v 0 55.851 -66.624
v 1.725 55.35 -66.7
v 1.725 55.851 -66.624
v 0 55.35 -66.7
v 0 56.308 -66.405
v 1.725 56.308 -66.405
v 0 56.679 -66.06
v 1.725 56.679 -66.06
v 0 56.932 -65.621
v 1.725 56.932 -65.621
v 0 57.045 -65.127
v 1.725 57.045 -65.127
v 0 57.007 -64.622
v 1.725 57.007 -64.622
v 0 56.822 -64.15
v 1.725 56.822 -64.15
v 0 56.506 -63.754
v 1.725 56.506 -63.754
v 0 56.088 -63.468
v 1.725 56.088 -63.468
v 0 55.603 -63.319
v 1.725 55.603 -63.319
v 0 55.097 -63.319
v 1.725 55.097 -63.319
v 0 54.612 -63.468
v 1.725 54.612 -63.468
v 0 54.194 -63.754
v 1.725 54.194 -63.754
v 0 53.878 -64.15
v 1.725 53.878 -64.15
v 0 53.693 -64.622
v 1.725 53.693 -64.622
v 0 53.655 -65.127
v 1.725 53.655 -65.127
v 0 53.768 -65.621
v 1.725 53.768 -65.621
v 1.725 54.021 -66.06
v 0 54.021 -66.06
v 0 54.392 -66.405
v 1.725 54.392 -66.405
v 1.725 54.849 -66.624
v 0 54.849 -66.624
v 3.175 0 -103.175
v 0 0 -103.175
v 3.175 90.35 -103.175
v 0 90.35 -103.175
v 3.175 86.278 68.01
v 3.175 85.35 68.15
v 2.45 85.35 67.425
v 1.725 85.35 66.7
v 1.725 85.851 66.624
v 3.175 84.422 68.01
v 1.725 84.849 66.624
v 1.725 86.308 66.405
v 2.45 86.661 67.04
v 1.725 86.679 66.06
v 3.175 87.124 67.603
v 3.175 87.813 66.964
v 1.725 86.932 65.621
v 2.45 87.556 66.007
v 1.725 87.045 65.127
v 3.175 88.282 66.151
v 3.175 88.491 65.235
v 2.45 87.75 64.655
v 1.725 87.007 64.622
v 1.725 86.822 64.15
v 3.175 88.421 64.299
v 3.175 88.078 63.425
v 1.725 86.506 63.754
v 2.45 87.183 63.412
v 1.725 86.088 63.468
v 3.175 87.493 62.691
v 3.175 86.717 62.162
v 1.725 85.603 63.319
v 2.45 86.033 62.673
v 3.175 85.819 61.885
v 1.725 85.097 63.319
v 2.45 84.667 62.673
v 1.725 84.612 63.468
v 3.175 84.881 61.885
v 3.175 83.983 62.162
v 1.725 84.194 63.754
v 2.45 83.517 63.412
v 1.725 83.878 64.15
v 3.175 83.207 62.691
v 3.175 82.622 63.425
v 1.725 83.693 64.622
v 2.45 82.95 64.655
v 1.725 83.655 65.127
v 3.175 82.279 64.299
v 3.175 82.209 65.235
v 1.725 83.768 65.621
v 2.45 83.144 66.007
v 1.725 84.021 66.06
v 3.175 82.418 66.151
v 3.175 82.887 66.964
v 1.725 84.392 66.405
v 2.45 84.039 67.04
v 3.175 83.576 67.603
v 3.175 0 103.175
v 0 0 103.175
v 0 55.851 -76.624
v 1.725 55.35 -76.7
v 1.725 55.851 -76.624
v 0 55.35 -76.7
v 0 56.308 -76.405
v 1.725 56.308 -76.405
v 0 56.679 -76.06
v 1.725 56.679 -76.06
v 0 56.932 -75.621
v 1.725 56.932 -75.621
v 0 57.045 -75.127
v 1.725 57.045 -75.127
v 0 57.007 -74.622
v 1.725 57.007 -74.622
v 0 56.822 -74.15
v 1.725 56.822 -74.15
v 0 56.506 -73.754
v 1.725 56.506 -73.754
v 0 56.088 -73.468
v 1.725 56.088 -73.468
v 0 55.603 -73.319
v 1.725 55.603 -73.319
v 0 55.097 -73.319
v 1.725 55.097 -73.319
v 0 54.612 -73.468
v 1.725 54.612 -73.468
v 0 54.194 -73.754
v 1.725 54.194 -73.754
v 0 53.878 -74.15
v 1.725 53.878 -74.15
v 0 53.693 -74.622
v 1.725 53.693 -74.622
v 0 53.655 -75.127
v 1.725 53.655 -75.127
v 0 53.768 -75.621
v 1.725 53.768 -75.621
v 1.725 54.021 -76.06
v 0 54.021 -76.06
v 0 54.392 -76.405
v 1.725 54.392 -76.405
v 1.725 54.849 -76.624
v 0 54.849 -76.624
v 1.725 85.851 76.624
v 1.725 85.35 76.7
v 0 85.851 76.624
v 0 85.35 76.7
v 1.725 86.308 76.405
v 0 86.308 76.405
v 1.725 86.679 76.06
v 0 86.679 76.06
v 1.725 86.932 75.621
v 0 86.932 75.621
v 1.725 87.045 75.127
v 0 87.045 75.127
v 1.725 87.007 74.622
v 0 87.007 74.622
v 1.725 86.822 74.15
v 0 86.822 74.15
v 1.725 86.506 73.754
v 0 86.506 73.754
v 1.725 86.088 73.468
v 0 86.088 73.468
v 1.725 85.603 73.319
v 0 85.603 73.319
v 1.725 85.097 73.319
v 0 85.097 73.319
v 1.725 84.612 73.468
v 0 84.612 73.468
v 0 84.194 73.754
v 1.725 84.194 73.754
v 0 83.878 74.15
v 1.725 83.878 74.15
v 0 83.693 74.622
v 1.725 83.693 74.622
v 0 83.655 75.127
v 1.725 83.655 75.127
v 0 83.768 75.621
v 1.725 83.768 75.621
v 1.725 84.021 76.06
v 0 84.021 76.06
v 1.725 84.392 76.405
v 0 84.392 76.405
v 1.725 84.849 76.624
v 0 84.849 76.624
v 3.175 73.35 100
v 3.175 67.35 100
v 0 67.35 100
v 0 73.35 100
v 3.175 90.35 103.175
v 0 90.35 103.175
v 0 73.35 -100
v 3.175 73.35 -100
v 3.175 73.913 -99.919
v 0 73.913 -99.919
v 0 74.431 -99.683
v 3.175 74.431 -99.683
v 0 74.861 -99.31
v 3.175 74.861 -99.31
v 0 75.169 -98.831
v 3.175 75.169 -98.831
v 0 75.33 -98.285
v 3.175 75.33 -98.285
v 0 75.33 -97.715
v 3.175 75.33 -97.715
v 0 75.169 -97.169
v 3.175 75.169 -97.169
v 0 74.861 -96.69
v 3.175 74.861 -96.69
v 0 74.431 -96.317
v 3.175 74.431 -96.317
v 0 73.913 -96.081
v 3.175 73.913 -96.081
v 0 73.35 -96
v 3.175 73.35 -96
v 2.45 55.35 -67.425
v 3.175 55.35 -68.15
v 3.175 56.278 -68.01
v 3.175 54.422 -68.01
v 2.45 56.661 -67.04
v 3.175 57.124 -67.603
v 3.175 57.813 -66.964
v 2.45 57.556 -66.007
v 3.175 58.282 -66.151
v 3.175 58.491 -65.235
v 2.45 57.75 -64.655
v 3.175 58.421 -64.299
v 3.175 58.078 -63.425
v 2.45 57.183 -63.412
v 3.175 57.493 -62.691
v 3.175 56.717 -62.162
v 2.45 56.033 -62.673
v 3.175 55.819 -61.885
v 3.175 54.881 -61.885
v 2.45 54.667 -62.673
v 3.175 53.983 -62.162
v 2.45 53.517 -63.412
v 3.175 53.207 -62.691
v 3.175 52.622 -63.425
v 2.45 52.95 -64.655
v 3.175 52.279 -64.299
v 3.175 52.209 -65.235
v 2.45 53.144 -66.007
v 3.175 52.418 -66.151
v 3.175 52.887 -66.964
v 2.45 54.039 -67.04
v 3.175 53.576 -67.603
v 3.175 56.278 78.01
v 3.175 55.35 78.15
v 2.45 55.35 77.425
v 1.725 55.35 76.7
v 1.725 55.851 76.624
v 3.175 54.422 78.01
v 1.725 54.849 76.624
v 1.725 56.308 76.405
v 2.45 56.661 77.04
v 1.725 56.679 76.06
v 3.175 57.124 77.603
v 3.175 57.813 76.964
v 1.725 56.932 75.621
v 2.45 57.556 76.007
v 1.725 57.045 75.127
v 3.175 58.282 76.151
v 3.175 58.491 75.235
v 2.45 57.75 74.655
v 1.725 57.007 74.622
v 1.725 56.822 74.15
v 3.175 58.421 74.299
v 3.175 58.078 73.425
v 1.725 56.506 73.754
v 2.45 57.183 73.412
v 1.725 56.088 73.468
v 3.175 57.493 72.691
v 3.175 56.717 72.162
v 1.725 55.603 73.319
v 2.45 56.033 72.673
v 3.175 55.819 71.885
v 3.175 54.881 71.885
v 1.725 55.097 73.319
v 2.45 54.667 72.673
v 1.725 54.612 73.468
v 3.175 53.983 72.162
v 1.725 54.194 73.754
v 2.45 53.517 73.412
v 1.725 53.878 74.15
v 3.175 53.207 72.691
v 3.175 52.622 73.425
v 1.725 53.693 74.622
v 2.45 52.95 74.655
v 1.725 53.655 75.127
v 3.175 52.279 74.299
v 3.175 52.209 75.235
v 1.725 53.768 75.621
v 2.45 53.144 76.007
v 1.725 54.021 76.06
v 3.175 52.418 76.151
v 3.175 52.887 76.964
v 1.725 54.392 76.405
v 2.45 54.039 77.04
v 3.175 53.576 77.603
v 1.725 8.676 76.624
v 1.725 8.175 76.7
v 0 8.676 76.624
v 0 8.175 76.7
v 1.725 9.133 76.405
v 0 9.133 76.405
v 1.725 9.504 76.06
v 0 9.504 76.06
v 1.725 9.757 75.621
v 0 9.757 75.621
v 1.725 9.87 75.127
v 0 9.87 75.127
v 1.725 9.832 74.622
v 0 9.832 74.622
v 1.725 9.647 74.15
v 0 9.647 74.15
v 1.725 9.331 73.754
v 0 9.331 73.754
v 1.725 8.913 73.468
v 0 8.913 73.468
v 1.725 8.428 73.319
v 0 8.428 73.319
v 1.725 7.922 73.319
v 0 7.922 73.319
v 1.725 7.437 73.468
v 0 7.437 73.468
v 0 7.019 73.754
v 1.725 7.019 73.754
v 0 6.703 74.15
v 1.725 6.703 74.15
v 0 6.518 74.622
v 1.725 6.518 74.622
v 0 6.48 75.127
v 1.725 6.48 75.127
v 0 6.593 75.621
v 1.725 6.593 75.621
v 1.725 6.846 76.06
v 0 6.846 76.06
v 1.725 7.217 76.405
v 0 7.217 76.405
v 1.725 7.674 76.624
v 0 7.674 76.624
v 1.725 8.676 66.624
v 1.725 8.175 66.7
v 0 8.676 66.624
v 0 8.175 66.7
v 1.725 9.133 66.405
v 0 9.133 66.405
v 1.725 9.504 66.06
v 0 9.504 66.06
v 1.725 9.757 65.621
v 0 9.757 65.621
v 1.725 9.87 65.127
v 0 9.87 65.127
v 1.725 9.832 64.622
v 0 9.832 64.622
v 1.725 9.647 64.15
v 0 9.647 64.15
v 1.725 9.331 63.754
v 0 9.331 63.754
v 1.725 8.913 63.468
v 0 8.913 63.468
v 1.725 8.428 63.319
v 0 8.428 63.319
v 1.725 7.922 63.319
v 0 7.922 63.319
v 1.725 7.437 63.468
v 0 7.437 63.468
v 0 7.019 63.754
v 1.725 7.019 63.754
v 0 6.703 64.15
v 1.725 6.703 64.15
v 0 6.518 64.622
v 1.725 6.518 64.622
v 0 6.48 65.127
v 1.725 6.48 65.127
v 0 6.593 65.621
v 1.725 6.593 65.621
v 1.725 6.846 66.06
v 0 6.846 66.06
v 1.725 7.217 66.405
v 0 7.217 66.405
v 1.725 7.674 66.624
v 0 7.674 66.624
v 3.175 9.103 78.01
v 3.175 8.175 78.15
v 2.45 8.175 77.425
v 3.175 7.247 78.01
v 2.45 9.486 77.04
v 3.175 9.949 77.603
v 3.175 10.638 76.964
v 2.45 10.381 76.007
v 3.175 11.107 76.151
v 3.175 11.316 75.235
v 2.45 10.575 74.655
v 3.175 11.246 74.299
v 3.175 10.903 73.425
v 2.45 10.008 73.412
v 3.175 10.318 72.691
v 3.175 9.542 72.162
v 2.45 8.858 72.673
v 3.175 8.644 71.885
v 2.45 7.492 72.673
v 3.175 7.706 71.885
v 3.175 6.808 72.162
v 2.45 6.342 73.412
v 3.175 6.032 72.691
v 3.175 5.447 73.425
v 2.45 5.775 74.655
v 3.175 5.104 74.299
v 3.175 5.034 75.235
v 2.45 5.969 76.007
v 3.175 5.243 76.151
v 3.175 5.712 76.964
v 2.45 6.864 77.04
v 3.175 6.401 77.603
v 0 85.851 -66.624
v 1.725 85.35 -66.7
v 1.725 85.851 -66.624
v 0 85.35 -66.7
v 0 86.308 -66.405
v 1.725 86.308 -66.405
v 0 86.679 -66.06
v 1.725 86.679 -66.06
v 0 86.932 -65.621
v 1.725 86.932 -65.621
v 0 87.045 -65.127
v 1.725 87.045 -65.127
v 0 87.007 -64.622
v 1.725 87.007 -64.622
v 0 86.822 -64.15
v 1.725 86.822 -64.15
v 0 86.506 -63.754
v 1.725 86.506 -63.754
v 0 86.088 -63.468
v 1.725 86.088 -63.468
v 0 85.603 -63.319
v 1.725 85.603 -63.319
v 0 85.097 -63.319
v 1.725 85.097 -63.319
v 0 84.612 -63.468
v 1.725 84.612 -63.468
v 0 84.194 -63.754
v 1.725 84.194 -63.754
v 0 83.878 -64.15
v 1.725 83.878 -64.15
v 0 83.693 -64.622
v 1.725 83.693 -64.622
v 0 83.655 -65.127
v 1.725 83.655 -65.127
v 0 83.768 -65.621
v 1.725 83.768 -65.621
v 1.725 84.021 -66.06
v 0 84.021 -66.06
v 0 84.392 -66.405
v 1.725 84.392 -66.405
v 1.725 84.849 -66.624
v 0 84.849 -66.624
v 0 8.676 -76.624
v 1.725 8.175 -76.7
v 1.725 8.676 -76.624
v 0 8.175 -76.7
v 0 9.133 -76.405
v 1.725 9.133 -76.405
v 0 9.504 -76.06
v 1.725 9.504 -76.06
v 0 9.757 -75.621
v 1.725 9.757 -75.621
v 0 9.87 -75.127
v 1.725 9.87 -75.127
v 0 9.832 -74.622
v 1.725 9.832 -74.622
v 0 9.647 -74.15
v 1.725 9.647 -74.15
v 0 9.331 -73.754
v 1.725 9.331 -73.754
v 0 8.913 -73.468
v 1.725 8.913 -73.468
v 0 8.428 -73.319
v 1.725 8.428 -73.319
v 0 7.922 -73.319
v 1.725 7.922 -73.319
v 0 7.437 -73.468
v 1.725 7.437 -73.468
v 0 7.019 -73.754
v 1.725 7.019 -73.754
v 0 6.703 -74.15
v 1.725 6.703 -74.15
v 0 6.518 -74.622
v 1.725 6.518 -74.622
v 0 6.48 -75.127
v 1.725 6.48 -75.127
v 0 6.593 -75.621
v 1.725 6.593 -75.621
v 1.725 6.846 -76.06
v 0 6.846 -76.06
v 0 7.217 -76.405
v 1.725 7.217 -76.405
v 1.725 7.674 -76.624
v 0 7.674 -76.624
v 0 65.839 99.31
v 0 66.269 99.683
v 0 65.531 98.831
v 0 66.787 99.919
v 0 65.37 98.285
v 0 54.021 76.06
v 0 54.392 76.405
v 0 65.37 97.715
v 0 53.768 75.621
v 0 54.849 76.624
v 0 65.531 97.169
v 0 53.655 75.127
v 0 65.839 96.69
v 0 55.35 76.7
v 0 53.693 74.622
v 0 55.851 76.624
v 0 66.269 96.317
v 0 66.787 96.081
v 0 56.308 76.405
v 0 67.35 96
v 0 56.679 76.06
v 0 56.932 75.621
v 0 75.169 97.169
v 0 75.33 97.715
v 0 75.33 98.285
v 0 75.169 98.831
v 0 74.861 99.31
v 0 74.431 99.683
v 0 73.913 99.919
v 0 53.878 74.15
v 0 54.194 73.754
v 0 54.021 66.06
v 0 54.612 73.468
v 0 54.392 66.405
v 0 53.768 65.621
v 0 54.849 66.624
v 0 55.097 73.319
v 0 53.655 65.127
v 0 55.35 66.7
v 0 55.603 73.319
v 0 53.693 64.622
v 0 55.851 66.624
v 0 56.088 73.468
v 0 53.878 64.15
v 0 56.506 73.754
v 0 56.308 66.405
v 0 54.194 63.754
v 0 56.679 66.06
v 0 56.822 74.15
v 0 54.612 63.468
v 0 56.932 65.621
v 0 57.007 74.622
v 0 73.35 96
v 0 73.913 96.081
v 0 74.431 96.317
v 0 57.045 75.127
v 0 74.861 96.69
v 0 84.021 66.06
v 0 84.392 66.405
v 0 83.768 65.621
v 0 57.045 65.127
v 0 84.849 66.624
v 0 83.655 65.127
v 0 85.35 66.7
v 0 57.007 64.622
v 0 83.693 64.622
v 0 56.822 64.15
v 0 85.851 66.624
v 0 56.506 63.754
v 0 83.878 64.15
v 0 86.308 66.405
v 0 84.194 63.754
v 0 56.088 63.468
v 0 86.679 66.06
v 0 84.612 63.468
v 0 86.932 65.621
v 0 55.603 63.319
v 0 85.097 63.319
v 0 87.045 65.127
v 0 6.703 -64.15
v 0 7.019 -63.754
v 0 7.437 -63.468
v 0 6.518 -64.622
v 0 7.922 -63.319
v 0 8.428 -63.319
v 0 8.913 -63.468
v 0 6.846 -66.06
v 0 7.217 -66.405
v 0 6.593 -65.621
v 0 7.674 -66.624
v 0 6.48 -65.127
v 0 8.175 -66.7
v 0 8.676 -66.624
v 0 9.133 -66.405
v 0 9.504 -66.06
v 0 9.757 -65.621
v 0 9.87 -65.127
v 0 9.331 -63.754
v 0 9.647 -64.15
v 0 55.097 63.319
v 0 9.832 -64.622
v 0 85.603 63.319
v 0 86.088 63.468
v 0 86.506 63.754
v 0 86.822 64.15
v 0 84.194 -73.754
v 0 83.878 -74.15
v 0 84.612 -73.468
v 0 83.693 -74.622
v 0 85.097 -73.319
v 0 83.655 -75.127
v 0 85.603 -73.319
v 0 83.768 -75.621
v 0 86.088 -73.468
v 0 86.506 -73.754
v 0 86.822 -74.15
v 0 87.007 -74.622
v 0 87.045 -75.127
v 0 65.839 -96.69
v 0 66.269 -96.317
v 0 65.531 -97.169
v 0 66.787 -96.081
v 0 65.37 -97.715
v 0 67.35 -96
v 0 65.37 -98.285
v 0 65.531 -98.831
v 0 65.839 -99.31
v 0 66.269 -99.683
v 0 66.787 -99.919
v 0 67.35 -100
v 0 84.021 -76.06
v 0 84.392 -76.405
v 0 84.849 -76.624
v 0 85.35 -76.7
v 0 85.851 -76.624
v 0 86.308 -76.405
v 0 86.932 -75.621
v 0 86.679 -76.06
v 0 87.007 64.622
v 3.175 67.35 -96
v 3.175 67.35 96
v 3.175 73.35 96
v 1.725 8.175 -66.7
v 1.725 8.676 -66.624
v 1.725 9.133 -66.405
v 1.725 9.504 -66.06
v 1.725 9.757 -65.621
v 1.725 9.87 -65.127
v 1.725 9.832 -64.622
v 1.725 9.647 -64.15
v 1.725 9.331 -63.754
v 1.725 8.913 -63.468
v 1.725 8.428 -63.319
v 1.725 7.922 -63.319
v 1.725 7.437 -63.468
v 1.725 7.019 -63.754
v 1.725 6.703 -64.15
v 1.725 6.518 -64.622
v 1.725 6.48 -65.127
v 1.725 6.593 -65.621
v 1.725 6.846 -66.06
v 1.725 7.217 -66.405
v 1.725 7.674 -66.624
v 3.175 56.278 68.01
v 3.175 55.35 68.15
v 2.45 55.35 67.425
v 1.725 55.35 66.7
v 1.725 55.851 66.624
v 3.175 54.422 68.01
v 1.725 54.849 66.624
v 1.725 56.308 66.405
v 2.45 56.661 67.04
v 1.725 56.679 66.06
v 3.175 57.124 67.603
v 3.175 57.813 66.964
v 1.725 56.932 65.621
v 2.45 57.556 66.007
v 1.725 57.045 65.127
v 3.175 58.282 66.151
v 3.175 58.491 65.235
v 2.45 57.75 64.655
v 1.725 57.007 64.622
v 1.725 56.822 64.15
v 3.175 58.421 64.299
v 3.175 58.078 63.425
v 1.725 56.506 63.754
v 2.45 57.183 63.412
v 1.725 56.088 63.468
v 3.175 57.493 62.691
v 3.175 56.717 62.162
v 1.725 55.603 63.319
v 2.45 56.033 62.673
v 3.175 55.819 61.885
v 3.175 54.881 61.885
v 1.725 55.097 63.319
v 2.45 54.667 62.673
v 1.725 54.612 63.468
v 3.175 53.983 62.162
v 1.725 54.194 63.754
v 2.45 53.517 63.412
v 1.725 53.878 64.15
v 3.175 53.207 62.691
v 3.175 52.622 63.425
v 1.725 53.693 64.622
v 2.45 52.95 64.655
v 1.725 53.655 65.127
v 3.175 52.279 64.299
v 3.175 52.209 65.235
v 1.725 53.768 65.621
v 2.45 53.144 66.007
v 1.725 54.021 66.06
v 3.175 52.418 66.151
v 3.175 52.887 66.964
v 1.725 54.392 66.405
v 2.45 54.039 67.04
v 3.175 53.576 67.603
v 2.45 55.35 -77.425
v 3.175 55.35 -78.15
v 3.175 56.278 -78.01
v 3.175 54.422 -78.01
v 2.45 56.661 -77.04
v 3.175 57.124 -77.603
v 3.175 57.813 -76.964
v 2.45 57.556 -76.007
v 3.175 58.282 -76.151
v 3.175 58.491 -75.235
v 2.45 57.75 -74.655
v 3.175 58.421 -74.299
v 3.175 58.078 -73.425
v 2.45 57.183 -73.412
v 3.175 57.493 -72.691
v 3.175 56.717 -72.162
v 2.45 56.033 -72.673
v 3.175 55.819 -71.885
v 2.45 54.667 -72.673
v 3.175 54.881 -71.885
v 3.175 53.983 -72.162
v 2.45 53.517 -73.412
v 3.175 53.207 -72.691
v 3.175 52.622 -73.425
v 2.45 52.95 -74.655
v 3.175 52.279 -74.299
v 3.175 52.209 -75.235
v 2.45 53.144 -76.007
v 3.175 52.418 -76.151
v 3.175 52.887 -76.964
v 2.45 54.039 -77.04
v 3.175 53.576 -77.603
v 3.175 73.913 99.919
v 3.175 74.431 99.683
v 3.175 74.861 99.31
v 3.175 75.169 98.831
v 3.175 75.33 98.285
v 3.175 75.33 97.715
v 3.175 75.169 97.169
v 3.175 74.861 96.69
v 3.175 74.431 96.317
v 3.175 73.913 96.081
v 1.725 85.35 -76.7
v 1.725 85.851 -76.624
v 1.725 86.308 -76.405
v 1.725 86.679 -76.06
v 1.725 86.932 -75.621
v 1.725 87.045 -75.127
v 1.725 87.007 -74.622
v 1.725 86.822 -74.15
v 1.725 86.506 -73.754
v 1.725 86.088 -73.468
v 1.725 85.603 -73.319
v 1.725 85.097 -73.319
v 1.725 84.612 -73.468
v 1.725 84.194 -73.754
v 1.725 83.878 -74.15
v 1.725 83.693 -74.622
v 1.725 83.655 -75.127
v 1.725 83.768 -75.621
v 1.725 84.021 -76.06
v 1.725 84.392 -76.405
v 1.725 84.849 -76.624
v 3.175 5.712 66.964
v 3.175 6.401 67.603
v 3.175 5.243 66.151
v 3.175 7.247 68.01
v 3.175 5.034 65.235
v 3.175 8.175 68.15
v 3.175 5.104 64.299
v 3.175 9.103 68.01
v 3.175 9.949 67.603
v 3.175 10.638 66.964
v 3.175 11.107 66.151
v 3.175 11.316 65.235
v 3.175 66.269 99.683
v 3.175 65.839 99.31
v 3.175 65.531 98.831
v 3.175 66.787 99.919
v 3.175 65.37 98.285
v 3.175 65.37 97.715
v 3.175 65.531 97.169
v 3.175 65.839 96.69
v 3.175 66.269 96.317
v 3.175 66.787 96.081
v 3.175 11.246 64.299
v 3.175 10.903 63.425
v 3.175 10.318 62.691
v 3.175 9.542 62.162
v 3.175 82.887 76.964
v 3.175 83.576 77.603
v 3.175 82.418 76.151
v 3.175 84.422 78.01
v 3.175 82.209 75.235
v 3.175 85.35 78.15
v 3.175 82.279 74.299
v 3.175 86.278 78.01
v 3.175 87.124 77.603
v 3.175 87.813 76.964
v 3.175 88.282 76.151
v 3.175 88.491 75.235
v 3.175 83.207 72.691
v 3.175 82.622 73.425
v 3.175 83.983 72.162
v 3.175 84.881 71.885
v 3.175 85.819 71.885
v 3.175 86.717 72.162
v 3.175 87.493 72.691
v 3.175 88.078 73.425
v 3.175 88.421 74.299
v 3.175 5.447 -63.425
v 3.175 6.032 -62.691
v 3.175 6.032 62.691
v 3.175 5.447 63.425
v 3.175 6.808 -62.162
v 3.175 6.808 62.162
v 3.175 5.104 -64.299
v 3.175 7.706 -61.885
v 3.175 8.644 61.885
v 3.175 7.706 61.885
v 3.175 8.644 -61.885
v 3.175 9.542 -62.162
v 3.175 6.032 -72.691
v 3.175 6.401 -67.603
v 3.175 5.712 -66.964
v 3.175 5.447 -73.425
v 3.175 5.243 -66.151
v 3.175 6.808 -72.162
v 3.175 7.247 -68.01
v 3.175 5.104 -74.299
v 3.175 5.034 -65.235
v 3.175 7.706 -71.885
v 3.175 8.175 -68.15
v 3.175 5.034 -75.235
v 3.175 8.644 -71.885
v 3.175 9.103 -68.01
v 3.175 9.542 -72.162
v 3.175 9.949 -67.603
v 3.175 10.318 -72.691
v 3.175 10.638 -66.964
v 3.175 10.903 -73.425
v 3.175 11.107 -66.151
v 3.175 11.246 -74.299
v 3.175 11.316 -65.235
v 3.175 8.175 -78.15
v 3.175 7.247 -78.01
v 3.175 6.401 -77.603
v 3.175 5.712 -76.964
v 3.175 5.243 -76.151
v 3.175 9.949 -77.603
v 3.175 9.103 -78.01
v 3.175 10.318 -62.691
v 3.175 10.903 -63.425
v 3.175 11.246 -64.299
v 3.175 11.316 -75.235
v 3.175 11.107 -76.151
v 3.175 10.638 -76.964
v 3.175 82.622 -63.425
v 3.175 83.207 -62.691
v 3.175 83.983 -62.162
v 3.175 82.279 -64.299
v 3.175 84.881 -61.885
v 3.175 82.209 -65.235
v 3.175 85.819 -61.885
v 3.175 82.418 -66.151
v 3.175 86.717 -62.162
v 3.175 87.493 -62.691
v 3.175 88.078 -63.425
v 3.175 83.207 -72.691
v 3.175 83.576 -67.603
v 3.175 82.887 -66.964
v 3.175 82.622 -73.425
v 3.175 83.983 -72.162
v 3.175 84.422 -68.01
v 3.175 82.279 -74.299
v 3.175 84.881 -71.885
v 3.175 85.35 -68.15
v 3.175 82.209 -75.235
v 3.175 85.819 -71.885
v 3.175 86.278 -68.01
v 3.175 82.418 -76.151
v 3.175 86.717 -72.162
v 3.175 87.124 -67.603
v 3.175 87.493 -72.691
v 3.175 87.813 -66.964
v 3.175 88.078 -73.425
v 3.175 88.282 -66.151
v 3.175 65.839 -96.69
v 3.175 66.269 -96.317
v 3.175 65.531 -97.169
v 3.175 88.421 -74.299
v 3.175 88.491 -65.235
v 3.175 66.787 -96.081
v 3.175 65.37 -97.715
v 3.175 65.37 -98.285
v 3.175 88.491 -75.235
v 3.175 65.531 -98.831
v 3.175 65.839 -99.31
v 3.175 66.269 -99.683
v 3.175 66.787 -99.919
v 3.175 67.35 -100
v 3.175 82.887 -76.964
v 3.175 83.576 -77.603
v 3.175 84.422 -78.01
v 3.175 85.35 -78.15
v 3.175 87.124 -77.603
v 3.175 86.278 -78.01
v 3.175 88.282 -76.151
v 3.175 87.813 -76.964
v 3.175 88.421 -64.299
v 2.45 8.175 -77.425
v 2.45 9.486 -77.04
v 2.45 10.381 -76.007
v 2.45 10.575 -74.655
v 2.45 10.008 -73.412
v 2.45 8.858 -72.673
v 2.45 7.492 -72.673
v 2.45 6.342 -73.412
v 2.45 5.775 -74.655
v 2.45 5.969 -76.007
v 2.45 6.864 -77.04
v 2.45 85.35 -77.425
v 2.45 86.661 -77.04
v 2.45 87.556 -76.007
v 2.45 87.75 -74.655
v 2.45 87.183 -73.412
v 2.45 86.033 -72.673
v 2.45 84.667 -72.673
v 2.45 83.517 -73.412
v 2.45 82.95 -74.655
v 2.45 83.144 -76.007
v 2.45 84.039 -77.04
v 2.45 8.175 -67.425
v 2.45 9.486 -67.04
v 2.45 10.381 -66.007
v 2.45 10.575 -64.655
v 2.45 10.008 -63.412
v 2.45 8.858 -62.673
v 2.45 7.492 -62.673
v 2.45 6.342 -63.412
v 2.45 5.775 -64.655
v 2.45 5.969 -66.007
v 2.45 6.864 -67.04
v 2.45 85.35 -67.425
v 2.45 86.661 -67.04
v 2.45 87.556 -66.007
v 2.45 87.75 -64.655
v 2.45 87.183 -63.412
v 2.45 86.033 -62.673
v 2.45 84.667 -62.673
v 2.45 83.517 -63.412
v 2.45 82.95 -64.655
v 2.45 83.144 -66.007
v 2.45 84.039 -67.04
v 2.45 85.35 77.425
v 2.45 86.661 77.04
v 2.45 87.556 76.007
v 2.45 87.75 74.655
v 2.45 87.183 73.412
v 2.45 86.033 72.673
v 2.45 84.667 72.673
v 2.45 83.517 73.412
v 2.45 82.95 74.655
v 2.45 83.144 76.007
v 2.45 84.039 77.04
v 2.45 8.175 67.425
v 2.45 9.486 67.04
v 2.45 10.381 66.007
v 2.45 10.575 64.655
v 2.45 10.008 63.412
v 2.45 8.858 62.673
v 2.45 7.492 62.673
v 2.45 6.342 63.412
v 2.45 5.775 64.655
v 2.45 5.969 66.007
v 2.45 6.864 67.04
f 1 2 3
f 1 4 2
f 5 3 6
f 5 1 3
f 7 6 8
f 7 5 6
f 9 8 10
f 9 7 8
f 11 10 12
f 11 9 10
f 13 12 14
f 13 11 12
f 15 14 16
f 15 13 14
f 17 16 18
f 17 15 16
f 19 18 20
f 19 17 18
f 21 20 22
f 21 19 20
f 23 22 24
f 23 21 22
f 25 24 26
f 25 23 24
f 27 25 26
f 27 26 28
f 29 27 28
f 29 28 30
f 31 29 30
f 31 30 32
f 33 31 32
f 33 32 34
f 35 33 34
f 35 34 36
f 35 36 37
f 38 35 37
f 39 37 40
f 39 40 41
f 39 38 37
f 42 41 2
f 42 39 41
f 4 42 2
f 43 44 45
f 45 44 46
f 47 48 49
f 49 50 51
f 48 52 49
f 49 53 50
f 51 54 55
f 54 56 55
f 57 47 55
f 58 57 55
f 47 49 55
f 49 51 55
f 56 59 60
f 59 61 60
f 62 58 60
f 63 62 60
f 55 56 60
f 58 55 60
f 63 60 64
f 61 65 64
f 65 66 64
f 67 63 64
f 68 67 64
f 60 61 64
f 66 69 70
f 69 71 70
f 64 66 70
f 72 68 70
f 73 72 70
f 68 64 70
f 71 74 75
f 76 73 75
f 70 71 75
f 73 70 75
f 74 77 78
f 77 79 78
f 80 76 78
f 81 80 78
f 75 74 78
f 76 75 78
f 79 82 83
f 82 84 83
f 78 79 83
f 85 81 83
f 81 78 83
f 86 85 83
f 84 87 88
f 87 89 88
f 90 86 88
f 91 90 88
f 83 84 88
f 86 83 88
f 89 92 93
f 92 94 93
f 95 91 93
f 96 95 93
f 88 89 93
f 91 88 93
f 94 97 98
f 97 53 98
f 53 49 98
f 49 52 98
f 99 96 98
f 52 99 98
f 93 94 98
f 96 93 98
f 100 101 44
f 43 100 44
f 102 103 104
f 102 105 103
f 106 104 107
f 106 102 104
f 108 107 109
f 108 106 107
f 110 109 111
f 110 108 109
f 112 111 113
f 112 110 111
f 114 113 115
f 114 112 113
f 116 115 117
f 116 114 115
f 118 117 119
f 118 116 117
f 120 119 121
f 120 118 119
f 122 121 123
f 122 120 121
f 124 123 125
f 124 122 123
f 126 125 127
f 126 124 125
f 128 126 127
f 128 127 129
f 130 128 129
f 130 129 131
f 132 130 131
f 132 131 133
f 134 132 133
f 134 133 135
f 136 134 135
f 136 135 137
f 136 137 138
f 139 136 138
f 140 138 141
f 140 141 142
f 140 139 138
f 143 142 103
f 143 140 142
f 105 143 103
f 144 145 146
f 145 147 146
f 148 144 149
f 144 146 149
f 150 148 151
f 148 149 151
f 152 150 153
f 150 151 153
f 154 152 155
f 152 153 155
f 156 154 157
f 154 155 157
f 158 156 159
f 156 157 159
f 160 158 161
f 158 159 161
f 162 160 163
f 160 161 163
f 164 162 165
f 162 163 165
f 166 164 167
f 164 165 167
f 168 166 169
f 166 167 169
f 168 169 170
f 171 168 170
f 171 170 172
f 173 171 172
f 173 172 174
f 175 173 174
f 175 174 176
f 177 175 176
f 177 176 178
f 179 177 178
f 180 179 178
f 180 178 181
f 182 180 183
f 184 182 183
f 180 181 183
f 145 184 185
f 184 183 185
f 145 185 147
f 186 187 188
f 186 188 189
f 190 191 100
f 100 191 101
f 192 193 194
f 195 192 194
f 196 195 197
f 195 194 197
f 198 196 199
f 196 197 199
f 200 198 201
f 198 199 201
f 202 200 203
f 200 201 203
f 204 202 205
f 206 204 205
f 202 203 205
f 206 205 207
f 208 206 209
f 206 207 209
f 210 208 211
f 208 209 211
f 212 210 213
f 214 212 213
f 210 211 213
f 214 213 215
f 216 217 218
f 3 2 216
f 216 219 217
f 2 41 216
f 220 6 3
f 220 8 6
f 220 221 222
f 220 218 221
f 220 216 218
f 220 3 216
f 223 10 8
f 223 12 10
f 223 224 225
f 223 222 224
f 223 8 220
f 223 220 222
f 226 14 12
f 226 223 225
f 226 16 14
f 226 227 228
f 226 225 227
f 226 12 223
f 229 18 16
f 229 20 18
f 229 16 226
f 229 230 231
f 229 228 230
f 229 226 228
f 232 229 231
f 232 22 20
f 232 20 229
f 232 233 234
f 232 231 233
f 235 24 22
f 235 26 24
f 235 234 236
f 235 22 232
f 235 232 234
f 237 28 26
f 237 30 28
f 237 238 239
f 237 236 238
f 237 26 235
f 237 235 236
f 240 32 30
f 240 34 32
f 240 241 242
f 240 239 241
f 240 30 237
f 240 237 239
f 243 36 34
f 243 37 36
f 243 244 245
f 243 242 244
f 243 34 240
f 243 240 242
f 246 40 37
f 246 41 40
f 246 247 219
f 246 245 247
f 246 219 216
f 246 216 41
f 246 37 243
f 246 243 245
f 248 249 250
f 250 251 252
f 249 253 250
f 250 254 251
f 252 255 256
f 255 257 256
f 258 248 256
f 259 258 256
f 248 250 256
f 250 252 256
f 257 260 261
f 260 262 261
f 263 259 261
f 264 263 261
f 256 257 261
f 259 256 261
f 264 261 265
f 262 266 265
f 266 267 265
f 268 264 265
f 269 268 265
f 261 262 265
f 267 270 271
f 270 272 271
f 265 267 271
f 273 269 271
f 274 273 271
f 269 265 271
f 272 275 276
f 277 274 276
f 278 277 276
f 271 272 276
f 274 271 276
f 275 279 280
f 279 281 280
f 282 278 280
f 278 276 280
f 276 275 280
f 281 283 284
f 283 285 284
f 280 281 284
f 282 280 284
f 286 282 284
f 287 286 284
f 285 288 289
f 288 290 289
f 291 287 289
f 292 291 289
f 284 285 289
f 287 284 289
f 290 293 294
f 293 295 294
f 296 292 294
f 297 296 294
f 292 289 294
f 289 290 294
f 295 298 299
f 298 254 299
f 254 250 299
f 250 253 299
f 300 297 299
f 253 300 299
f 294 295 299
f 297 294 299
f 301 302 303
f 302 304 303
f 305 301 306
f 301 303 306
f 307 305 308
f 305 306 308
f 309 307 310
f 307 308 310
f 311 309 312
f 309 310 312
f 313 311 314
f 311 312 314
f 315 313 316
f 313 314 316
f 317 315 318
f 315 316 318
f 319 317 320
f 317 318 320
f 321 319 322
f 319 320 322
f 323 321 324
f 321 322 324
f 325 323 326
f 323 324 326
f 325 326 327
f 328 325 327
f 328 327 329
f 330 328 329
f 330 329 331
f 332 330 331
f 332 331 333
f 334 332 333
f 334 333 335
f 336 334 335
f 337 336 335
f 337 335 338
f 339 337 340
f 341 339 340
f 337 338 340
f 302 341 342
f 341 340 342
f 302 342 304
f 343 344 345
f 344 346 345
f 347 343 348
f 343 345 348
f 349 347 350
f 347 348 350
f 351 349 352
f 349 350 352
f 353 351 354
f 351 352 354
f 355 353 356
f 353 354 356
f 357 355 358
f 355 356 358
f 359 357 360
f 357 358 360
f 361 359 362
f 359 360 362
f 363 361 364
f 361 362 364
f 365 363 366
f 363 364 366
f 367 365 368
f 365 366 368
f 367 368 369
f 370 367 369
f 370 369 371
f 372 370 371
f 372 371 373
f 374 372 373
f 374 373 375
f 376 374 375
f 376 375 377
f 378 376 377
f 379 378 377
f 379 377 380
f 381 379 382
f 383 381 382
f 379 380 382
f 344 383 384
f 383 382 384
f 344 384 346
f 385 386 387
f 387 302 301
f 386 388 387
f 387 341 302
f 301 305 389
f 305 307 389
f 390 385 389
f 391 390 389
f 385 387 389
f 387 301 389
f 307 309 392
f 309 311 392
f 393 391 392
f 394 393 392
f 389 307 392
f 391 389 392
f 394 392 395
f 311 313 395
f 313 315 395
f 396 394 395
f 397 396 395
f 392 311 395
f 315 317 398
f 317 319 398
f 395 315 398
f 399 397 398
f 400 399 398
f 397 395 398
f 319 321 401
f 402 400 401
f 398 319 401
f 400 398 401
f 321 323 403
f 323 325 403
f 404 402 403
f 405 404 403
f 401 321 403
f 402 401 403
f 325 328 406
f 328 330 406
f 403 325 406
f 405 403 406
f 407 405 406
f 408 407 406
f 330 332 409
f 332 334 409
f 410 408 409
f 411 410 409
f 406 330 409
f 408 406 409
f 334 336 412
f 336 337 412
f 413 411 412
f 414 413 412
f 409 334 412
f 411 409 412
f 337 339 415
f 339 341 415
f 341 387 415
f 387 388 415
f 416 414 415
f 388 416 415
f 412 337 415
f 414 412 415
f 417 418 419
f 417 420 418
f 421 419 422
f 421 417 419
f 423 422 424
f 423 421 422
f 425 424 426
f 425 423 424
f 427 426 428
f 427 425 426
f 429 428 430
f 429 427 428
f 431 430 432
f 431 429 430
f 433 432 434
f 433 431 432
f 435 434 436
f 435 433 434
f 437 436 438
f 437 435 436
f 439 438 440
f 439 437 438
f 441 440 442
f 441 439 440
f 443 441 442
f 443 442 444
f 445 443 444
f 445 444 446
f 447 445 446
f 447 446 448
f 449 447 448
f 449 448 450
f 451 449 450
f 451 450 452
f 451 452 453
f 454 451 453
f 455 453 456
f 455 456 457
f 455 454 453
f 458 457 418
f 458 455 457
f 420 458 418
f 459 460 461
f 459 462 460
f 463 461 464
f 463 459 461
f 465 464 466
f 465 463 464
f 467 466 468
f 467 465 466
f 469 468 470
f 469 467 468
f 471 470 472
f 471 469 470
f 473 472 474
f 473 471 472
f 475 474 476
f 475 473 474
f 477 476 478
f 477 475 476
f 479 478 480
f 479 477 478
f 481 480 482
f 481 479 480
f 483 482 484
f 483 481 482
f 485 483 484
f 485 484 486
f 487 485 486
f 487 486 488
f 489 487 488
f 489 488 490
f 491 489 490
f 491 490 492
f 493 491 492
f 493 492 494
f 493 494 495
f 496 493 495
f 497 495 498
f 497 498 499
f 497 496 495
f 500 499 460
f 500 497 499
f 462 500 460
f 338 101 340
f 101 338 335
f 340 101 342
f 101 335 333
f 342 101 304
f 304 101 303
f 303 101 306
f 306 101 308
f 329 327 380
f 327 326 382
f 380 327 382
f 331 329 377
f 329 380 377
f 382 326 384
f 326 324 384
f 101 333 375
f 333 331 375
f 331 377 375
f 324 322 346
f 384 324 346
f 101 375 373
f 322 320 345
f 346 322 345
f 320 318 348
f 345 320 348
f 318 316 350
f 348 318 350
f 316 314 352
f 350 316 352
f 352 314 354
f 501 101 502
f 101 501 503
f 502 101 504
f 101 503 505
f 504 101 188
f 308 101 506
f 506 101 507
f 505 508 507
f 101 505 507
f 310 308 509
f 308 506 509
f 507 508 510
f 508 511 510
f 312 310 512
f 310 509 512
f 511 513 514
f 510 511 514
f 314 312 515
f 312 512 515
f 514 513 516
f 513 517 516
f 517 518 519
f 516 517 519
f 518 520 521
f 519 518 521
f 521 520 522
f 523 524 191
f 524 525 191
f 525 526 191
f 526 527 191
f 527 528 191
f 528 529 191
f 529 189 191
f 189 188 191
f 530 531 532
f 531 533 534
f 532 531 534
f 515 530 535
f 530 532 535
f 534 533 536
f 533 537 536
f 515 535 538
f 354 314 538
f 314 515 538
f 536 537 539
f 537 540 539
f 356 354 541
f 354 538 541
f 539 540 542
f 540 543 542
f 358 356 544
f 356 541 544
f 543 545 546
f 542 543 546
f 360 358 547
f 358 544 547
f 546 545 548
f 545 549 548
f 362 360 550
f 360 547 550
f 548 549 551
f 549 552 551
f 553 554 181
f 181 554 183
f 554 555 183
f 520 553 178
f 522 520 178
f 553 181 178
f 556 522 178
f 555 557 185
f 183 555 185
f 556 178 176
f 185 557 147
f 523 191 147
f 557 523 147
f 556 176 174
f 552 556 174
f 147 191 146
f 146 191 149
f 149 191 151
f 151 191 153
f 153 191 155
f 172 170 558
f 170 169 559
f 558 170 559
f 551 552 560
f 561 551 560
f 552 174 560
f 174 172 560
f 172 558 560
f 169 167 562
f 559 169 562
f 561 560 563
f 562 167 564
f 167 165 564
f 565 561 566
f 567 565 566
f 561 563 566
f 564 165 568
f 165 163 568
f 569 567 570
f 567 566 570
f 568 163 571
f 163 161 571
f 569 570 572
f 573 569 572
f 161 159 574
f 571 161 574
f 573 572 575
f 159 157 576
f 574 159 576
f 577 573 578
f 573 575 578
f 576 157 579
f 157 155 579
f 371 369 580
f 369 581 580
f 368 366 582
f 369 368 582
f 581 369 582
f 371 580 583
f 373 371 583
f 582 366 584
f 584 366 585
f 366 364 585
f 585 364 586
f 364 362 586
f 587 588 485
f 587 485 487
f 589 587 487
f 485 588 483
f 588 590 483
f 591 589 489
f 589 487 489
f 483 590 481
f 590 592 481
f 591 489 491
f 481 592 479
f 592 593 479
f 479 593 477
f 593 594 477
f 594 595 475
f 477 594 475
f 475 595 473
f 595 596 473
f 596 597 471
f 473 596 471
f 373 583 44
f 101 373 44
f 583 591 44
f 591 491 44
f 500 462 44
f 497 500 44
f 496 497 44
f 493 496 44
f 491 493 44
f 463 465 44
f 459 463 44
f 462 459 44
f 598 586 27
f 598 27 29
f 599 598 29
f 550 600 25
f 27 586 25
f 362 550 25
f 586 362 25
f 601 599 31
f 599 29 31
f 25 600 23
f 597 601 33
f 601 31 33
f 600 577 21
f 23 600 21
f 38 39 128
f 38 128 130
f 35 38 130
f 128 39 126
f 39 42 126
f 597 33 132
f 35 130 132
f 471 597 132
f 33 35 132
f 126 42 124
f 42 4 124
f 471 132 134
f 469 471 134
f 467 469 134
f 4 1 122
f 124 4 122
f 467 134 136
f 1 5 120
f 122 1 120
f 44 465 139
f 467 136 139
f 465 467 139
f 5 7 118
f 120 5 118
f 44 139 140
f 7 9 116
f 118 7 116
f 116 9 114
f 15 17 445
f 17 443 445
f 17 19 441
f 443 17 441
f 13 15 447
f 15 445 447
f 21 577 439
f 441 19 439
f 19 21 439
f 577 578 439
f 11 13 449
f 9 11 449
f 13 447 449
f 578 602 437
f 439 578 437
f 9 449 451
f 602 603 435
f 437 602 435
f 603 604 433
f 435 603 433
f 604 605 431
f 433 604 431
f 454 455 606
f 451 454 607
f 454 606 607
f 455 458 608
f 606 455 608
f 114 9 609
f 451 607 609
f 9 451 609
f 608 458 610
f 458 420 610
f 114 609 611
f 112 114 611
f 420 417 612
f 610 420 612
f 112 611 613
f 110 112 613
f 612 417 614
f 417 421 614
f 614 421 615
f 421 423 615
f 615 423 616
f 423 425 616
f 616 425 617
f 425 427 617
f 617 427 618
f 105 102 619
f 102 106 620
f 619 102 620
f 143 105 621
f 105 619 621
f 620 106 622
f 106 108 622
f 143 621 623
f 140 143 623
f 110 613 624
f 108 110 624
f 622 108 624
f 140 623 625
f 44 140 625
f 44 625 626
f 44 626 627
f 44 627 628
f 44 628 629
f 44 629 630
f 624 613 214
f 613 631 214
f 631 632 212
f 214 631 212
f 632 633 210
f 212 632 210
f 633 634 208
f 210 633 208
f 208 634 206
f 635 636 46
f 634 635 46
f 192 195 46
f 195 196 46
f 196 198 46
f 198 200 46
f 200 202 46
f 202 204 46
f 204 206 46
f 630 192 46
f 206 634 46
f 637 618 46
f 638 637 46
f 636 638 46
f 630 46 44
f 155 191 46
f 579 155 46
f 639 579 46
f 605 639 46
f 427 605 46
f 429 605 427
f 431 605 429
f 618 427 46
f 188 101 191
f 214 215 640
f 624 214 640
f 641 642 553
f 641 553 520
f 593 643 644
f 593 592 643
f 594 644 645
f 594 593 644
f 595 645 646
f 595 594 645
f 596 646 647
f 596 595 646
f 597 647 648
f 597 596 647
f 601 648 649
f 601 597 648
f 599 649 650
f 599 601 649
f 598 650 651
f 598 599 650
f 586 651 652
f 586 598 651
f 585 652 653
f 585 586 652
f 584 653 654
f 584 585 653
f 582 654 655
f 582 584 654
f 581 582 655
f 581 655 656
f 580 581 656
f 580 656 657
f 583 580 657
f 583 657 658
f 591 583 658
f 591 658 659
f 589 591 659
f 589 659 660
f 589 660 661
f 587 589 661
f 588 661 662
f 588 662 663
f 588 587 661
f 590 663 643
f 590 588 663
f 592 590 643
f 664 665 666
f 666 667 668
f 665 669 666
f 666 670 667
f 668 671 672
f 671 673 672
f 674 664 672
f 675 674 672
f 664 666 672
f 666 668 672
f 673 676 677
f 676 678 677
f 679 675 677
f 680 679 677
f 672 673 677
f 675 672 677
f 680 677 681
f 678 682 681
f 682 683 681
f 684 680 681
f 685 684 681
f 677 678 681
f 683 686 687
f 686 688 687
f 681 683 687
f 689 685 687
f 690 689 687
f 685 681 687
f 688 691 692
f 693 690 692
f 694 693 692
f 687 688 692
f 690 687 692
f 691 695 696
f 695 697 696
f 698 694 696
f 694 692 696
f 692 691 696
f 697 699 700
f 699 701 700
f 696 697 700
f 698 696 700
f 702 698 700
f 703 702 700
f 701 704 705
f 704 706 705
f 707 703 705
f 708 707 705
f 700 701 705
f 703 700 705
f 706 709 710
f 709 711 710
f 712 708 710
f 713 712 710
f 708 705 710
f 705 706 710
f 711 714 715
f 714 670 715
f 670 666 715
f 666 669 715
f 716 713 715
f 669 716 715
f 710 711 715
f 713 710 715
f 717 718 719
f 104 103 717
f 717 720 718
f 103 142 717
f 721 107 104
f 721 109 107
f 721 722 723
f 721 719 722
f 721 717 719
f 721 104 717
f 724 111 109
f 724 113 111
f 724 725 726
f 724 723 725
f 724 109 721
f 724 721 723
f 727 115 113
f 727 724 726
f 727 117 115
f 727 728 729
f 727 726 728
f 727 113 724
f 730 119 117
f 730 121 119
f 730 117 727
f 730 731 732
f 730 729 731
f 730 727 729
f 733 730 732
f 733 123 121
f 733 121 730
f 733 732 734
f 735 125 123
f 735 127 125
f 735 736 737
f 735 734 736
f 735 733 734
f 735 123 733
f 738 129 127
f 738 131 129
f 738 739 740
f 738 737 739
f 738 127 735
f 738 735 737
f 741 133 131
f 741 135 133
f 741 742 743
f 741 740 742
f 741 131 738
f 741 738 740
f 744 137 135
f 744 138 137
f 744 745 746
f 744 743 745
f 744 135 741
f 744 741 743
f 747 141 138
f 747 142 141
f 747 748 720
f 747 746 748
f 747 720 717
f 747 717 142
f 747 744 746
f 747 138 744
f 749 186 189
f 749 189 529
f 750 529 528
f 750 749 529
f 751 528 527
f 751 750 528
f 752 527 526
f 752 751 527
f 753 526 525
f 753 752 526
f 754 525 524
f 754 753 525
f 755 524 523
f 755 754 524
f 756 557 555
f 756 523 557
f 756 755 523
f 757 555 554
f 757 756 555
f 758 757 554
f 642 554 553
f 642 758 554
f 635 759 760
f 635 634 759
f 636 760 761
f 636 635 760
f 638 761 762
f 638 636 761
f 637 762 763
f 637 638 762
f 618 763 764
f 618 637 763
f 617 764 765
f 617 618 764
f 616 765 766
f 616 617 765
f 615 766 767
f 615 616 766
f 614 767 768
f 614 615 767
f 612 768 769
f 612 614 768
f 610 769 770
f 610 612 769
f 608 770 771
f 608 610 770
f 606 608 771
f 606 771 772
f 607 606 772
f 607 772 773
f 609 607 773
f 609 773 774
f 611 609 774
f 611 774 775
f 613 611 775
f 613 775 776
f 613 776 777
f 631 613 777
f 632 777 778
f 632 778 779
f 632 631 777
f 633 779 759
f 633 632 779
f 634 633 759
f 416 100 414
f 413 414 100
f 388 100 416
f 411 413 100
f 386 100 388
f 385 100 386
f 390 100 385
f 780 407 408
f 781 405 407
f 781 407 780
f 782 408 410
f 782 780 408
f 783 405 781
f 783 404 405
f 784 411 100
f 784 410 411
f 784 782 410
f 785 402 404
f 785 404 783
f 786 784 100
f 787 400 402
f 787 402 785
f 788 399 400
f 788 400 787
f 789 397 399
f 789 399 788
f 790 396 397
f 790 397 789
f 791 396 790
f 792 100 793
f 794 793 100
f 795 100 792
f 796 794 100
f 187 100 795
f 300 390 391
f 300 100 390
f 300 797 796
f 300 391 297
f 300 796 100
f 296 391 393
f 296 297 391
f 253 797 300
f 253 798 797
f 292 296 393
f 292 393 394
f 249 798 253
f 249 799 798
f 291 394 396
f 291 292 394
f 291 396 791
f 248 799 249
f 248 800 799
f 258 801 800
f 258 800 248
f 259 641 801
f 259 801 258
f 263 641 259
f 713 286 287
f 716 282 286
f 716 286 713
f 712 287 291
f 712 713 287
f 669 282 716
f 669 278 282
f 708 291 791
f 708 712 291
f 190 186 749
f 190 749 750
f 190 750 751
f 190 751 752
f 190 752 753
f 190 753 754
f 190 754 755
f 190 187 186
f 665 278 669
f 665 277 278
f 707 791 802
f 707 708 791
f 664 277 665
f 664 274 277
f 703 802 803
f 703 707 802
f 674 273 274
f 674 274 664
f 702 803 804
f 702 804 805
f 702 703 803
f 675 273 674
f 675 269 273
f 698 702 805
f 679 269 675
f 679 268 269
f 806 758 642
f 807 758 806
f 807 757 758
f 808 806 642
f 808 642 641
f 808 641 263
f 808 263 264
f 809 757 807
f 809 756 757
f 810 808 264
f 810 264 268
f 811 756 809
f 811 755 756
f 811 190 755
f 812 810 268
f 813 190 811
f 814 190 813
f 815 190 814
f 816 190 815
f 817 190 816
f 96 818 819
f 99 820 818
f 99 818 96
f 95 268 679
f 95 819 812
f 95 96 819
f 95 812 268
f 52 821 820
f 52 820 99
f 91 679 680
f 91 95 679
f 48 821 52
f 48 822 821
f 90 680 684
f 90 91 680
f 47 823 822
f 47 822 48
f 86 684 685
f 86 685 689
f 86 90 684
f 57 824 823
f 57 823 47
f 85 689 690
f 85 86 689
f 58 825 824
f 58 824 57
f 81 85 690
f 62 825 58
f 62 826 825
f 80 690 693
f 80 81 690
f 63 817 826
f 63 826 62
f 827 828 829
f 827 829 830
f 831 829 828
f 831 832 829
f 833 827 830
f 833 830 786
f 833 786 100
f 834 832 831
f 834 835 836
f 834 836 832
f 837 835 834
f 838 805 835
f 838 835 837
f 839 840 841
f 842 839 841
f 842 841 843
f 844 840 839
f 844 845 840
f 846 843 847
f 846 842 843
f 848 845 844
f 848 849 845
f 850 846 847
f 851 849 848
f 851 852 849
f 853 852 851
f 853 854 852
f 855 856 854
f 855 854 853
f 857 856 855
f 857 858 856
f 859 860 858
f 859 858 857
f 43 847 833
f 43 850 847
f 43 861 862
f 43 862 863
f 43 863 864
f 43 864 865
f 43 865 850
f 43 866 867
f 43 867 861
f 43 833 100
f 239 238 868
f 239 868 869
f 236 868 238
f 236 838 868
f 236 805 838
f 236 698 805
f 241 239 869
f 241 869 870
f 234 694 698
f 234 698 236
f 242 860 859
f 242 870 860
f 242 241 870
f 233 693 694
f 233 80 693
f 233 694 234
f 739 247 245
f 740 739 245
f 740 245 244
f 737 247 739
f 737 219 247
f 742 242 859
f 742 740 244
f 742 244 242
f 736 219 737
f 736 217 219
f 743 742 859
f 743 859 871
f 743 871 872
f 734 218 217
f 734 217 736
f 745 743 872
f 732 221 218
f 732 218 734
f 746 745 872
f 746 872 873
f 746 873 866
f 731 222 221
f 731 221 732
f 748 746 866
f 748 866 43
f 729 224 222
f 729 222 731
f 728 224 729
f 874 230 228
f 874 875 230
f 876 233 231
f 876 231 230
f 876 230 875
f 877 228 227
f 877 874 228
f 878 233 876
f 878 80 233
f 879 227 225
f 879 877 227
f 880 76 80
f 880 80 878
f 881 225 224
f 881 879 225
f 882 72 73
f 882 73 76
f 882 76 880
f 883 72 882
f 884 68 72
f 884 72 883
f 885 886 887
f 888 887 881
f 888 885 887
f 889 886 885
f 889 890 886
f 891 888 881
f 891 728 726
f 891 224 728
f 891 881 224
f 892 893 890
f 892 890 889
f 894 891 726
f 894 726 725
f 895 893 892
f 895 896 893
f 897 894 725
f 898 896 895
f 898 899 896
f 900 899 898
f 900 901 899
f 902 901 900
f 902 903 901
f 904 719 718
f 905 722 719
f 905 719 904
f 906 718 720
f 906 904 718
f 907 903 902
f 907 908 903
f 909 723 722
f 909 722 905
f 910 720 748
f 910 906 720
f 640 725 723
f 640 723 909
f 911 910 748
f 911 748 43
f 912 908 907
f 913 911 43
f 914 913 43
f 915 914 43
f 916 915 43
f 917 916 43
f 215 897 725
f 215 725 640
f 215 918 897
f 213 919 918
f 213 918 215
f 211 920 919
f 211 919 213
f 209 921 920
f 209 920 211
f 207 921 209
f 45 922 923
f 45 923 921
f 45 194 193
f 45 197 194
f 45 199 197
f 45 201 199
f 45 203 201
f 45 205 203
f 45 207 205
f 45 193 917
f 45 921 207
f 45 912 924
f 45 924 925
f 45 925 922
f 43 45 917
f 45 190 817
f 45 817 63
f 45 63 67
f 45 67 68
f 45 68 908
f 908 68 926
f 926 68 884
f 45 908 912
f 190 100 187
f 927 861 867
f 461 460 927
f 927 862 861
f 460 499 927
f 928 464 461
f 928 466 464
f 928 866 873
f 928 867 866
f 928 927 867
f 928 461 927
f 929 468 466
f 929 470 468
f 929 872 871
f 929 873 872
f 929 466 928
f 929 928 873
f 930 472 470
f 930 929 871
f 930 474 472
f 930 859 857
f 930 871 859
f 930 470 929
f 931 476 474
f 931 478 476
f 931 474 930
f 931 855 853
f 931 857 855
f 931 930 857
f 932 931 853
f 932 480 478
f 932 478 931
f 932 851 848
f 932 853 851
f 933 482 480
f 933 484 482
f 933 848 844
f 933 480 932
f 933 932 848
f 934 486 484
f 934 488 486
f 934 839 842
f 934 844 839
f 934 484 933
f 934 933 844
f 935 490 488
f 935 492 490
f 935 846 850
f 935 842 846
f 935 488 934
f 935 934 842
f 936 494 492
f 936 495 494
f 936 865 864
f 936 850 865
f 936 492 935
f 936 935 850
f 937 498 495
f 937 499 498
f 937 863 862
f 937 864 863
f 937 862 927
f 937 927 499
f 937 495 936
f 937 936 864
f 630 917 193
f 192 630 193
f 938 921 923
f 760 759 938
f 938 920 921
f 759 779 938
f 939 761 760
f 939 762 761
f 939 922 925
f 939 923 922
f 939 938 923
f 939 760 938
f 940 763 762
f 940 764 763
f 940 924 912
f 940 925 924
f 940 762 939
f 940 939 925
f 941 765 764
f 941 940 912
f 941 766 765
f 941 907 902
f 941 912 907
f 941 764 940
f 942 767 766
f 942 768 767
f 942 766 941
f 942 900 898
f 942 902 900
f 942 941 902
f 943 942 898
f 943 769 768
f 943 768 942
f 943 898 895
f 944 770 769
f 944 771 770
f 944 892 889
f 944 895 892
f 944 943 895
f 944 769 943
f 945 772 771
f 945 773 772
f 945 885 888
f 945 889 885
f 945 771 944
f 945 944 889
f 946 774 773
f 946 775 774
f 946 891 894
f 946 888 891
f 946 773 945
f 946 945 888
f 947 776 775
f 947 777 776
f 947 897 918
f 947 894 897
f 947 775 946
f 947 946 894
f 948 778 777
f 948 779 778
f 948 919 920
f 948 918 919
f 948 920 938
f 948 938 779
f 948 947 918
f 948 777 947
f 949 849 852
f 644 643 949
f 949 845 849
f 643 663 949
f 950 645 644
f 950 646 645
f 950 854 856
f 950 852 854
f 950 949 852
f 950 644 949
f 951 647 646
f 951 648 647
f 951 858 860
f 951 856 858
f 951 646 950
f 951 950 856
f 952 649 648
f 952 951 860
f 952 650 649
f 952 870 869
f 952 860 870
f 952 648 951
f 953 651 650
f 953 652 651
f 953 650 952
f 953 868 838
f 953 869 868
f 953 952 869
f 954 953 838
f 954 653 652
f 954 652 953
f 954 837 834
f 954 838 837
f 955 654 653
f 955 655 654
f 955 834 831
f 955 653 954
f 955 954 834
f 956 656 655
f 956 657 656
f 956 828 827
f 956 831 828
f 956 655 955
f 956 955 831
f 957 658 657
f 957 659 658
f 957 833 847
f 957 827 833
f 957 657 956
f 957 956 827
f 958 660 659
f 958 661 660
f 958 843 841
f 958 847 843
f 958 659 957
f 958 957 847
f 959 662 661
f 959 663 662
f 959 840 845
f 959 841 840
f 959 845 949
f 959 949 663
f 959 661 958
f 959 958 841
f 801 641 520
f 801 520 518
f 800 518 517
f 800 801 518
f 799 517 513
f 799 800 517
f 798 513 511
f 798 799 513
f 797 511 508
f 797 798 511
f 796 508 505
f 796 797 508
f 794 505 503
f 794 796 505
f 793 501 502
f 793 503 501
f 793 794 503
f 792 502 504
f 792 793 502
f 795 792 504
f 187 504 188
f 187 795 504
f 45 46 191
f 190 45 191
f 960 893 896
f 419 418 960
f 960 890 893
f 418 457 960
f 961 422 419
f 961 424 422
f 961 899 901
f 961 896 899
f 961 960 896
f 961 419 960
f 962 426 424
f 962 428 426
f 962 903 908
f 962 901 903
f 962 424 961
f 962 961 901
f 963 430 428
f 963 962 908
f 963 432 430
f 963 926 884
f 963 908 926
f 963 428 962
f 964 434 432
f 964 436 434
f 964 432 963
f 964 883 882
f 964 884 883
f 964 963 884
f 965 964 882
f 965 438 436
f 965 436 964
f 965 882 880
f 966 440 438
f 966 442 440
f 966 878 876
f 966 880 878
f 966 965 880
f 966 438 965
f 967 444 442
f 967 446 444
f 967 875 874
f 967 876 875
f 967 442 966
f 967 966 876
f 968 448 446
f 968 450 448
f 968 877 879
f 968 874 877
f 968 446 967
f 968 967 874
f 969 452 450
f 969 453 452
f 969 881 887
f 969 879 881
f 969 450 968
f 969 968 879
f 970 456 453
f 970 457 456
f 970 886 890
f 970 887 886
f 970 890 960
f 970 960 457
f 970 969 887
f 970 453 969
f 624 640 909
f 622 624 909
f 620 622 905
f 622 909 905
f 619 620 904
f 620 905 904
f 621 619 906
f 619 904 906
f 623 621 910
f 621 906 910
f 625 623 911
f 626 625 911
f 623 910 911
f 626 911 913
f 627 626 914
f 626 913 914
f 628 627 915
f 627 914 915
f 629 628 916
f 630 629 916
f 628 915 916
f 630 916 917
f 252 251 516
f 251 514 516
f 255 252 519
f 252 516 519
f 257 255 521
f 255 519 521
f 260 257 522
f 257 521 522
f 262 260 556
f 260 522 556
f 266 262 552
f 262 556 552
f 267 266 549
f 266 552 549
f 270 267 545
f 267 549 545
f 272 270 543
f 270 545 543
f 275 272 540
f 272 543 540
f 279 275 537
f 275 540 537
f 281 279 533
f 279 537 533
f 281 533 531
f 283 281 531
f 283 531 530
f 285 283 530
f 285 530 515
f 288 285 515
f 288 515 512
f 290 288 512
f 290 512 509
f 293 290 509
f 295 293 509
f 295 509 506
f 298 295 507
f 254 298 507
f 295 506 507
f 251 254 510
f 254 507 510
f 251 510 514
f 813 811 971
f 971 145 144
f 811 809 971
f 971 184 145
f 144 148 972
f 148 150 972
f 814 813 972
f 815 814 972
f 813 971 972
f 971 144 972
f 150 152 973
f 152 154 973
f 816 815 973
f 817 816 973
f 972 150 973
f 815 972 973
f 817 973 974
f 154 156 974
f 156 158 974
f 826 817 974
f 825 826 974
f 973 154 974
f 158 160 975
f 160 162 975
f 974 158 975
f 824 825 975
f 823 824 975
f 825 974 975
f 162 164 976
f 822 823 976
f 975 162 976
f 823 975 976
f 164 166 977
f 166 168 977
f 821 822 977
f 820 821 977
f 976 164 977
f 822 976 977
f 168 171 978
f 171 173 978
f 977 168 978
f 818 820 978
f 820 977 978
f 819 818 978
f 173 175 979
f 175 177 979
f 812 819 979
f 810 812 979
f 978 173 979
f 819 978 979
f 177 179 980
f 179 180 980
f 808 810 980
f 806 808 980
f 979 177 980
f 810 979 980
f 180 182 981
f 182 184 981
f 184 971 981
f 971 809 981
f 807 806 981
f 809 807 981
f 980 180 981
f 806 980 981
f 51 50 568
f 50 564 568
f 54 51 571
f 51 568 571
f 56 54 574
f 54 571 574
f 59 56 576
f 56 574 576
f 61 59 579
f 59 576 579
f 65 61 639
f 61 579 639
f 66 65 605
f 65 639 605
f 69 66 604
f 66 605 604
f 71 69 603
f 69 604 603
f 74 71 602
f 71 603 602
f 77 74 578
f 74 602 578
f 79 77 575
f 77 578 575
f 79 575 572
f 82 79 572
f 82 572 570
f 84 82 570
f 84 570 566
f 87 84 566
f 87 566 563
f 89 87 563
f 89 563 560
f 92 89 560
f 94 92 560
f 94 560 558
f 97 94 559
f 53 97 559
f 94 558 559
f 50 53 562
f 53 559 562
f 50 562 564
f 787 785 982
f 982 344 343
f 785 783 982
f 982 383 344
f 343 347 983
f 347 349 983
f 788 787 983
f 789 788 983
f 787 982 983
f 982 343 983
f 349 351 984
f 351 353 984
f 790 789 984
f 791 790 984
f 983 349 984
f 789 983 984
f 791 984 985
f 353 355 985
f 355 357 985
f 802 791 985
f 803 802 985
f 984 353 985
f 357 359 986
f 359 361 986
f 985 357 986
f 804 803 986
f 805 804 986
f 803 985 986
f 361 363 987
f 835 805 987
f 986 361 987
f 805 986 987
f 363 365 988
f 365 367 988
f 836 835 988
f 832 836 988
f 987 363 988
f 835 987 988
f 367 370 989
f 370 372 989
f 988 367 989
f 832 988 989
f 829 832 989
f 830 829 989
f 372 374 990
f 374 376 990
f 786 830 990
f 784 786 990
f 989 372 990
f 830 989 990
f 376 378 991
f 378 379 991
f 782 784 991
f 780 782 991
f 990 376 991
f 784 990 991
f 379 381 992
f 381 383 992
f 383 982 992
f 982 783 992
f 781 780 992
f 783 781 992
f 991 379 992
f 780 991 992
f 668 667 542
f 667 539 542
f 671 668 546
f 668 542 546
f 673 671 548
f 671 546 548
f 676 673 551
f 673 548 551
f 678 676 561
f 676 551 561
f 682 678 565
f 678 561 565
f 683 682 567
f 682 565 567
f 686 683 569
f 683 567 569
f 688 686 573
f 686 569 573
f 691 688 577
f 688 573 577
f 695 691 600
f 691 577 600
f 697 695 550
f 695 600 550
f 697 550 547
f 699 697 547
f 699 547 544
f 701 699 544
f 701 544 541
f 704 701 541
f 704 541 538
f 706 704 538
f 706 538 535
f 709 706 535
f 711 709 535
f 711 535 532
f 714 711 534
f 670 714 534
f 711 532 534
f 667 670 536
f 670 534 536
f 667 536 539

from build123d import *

# Parameters (mm, degrees)
BOSS_EXTRUDE1_DEPTH                             = 3.175
CSK_FOR_M3_FLAT_HEAD_MACHINE_SCREW1_D           = 3.4
CSK_FOR_M3_FLAT_HEAD_MACHINE_SCREW1_CSINK_D     = 6.3
CSK_FOR_M3_FLAT_HEAD_MACHINE_SCREW1_CSINK_ANGLE = 90
CUT_EXTRUDE1_DEPTH                              = 4.175


with BuildPart() as part:
    # Sketch1 → Boss-Extrude1 (new body)
    with BuildSketch(Plane(origin=(0, 0, 0), x_dir=(0, 0, -1), z_dir=(1, 0, 0))):
        Polygon((103.175, 0), (103.175, 3.175), (103.175, 47.175), (103.175, 50.35), (103.175, 60.35), (103.175, 90.35), (-103.175, 90.35), (-103.175, 60.35), (-103.175, 50.35), (-103.175, 47.175), (-103.175, 3.175), (-103.175, 0), align=None)
    extrude(amount=BOSS_EXTRUDE1_DEPTH)

    # CSK for M3 Flat Head Machine Screw1 (through all)
    with Locations(Plane(origin=(3.175, 0, 0), x_dir=(0, 0, -1), z_dir=(1, 0, 0))):
        with Locations((-75, 8.175), (-65, 8.175), (-75, 55.35), (-65, 55.35), (-75, 85.35), (-65, 85.35)):
            csk_for_m3_flat_head_machine_screw1 = CounterSinkHole(CSK_FOR_M3_FLAT_HEAD_MACHINE_SCREW1_D / 2, CSK_FOR_M3_FLAT_HEAD_MACHINE_SCREW1_CSINK_D / 2, counter_sink_angle=CSK_FOR_M3_FLAT_HEAD_MACHINE_SCREW1_CSINK_ANGLE)

    # Mirror1: CSK for M3 Flat Head Machine Screw1 across plane
    add(csk_for_m3_flat_head_machine_screw1.mirror(Plane.XY), mode=Mode.SUBTRACT)

    # Sketch4 → Cut-Extrude1 (cut, through all)
    with BuildSketch(Plane(origin=(3.175, 0, 0), x_dir=(0, 0, -1), z_dir=(1, 0, 0))):
        with BuildLine():
            Line((-96, 73.35), (-96, 67.35))
            ThreePointArc((-96, 67.35), (-98, 65.35), (-100, 67.35))
            Line((-100, 67.35), (-100, 73.35))
            ThreePointArc((-100, 73.35), (-98, 75.35), (-96, 73.35))
        make_face()
        with BuildLine():
            Line((96, 73.35), (96, 67.35))
            ThreePointArc((96, 67.35), (98, 65.35), (100, 67.35))
            Line((100, 67.35), (100, 73.35))
            ThreePointArc((100, 73.35), (98, 75.35), (96, 73.35))
        make_face()
    extrude(amount=-CUT_EXTRUDE1_DEPTH, mode=Mode.SUBTRACT)


solid = part.part
